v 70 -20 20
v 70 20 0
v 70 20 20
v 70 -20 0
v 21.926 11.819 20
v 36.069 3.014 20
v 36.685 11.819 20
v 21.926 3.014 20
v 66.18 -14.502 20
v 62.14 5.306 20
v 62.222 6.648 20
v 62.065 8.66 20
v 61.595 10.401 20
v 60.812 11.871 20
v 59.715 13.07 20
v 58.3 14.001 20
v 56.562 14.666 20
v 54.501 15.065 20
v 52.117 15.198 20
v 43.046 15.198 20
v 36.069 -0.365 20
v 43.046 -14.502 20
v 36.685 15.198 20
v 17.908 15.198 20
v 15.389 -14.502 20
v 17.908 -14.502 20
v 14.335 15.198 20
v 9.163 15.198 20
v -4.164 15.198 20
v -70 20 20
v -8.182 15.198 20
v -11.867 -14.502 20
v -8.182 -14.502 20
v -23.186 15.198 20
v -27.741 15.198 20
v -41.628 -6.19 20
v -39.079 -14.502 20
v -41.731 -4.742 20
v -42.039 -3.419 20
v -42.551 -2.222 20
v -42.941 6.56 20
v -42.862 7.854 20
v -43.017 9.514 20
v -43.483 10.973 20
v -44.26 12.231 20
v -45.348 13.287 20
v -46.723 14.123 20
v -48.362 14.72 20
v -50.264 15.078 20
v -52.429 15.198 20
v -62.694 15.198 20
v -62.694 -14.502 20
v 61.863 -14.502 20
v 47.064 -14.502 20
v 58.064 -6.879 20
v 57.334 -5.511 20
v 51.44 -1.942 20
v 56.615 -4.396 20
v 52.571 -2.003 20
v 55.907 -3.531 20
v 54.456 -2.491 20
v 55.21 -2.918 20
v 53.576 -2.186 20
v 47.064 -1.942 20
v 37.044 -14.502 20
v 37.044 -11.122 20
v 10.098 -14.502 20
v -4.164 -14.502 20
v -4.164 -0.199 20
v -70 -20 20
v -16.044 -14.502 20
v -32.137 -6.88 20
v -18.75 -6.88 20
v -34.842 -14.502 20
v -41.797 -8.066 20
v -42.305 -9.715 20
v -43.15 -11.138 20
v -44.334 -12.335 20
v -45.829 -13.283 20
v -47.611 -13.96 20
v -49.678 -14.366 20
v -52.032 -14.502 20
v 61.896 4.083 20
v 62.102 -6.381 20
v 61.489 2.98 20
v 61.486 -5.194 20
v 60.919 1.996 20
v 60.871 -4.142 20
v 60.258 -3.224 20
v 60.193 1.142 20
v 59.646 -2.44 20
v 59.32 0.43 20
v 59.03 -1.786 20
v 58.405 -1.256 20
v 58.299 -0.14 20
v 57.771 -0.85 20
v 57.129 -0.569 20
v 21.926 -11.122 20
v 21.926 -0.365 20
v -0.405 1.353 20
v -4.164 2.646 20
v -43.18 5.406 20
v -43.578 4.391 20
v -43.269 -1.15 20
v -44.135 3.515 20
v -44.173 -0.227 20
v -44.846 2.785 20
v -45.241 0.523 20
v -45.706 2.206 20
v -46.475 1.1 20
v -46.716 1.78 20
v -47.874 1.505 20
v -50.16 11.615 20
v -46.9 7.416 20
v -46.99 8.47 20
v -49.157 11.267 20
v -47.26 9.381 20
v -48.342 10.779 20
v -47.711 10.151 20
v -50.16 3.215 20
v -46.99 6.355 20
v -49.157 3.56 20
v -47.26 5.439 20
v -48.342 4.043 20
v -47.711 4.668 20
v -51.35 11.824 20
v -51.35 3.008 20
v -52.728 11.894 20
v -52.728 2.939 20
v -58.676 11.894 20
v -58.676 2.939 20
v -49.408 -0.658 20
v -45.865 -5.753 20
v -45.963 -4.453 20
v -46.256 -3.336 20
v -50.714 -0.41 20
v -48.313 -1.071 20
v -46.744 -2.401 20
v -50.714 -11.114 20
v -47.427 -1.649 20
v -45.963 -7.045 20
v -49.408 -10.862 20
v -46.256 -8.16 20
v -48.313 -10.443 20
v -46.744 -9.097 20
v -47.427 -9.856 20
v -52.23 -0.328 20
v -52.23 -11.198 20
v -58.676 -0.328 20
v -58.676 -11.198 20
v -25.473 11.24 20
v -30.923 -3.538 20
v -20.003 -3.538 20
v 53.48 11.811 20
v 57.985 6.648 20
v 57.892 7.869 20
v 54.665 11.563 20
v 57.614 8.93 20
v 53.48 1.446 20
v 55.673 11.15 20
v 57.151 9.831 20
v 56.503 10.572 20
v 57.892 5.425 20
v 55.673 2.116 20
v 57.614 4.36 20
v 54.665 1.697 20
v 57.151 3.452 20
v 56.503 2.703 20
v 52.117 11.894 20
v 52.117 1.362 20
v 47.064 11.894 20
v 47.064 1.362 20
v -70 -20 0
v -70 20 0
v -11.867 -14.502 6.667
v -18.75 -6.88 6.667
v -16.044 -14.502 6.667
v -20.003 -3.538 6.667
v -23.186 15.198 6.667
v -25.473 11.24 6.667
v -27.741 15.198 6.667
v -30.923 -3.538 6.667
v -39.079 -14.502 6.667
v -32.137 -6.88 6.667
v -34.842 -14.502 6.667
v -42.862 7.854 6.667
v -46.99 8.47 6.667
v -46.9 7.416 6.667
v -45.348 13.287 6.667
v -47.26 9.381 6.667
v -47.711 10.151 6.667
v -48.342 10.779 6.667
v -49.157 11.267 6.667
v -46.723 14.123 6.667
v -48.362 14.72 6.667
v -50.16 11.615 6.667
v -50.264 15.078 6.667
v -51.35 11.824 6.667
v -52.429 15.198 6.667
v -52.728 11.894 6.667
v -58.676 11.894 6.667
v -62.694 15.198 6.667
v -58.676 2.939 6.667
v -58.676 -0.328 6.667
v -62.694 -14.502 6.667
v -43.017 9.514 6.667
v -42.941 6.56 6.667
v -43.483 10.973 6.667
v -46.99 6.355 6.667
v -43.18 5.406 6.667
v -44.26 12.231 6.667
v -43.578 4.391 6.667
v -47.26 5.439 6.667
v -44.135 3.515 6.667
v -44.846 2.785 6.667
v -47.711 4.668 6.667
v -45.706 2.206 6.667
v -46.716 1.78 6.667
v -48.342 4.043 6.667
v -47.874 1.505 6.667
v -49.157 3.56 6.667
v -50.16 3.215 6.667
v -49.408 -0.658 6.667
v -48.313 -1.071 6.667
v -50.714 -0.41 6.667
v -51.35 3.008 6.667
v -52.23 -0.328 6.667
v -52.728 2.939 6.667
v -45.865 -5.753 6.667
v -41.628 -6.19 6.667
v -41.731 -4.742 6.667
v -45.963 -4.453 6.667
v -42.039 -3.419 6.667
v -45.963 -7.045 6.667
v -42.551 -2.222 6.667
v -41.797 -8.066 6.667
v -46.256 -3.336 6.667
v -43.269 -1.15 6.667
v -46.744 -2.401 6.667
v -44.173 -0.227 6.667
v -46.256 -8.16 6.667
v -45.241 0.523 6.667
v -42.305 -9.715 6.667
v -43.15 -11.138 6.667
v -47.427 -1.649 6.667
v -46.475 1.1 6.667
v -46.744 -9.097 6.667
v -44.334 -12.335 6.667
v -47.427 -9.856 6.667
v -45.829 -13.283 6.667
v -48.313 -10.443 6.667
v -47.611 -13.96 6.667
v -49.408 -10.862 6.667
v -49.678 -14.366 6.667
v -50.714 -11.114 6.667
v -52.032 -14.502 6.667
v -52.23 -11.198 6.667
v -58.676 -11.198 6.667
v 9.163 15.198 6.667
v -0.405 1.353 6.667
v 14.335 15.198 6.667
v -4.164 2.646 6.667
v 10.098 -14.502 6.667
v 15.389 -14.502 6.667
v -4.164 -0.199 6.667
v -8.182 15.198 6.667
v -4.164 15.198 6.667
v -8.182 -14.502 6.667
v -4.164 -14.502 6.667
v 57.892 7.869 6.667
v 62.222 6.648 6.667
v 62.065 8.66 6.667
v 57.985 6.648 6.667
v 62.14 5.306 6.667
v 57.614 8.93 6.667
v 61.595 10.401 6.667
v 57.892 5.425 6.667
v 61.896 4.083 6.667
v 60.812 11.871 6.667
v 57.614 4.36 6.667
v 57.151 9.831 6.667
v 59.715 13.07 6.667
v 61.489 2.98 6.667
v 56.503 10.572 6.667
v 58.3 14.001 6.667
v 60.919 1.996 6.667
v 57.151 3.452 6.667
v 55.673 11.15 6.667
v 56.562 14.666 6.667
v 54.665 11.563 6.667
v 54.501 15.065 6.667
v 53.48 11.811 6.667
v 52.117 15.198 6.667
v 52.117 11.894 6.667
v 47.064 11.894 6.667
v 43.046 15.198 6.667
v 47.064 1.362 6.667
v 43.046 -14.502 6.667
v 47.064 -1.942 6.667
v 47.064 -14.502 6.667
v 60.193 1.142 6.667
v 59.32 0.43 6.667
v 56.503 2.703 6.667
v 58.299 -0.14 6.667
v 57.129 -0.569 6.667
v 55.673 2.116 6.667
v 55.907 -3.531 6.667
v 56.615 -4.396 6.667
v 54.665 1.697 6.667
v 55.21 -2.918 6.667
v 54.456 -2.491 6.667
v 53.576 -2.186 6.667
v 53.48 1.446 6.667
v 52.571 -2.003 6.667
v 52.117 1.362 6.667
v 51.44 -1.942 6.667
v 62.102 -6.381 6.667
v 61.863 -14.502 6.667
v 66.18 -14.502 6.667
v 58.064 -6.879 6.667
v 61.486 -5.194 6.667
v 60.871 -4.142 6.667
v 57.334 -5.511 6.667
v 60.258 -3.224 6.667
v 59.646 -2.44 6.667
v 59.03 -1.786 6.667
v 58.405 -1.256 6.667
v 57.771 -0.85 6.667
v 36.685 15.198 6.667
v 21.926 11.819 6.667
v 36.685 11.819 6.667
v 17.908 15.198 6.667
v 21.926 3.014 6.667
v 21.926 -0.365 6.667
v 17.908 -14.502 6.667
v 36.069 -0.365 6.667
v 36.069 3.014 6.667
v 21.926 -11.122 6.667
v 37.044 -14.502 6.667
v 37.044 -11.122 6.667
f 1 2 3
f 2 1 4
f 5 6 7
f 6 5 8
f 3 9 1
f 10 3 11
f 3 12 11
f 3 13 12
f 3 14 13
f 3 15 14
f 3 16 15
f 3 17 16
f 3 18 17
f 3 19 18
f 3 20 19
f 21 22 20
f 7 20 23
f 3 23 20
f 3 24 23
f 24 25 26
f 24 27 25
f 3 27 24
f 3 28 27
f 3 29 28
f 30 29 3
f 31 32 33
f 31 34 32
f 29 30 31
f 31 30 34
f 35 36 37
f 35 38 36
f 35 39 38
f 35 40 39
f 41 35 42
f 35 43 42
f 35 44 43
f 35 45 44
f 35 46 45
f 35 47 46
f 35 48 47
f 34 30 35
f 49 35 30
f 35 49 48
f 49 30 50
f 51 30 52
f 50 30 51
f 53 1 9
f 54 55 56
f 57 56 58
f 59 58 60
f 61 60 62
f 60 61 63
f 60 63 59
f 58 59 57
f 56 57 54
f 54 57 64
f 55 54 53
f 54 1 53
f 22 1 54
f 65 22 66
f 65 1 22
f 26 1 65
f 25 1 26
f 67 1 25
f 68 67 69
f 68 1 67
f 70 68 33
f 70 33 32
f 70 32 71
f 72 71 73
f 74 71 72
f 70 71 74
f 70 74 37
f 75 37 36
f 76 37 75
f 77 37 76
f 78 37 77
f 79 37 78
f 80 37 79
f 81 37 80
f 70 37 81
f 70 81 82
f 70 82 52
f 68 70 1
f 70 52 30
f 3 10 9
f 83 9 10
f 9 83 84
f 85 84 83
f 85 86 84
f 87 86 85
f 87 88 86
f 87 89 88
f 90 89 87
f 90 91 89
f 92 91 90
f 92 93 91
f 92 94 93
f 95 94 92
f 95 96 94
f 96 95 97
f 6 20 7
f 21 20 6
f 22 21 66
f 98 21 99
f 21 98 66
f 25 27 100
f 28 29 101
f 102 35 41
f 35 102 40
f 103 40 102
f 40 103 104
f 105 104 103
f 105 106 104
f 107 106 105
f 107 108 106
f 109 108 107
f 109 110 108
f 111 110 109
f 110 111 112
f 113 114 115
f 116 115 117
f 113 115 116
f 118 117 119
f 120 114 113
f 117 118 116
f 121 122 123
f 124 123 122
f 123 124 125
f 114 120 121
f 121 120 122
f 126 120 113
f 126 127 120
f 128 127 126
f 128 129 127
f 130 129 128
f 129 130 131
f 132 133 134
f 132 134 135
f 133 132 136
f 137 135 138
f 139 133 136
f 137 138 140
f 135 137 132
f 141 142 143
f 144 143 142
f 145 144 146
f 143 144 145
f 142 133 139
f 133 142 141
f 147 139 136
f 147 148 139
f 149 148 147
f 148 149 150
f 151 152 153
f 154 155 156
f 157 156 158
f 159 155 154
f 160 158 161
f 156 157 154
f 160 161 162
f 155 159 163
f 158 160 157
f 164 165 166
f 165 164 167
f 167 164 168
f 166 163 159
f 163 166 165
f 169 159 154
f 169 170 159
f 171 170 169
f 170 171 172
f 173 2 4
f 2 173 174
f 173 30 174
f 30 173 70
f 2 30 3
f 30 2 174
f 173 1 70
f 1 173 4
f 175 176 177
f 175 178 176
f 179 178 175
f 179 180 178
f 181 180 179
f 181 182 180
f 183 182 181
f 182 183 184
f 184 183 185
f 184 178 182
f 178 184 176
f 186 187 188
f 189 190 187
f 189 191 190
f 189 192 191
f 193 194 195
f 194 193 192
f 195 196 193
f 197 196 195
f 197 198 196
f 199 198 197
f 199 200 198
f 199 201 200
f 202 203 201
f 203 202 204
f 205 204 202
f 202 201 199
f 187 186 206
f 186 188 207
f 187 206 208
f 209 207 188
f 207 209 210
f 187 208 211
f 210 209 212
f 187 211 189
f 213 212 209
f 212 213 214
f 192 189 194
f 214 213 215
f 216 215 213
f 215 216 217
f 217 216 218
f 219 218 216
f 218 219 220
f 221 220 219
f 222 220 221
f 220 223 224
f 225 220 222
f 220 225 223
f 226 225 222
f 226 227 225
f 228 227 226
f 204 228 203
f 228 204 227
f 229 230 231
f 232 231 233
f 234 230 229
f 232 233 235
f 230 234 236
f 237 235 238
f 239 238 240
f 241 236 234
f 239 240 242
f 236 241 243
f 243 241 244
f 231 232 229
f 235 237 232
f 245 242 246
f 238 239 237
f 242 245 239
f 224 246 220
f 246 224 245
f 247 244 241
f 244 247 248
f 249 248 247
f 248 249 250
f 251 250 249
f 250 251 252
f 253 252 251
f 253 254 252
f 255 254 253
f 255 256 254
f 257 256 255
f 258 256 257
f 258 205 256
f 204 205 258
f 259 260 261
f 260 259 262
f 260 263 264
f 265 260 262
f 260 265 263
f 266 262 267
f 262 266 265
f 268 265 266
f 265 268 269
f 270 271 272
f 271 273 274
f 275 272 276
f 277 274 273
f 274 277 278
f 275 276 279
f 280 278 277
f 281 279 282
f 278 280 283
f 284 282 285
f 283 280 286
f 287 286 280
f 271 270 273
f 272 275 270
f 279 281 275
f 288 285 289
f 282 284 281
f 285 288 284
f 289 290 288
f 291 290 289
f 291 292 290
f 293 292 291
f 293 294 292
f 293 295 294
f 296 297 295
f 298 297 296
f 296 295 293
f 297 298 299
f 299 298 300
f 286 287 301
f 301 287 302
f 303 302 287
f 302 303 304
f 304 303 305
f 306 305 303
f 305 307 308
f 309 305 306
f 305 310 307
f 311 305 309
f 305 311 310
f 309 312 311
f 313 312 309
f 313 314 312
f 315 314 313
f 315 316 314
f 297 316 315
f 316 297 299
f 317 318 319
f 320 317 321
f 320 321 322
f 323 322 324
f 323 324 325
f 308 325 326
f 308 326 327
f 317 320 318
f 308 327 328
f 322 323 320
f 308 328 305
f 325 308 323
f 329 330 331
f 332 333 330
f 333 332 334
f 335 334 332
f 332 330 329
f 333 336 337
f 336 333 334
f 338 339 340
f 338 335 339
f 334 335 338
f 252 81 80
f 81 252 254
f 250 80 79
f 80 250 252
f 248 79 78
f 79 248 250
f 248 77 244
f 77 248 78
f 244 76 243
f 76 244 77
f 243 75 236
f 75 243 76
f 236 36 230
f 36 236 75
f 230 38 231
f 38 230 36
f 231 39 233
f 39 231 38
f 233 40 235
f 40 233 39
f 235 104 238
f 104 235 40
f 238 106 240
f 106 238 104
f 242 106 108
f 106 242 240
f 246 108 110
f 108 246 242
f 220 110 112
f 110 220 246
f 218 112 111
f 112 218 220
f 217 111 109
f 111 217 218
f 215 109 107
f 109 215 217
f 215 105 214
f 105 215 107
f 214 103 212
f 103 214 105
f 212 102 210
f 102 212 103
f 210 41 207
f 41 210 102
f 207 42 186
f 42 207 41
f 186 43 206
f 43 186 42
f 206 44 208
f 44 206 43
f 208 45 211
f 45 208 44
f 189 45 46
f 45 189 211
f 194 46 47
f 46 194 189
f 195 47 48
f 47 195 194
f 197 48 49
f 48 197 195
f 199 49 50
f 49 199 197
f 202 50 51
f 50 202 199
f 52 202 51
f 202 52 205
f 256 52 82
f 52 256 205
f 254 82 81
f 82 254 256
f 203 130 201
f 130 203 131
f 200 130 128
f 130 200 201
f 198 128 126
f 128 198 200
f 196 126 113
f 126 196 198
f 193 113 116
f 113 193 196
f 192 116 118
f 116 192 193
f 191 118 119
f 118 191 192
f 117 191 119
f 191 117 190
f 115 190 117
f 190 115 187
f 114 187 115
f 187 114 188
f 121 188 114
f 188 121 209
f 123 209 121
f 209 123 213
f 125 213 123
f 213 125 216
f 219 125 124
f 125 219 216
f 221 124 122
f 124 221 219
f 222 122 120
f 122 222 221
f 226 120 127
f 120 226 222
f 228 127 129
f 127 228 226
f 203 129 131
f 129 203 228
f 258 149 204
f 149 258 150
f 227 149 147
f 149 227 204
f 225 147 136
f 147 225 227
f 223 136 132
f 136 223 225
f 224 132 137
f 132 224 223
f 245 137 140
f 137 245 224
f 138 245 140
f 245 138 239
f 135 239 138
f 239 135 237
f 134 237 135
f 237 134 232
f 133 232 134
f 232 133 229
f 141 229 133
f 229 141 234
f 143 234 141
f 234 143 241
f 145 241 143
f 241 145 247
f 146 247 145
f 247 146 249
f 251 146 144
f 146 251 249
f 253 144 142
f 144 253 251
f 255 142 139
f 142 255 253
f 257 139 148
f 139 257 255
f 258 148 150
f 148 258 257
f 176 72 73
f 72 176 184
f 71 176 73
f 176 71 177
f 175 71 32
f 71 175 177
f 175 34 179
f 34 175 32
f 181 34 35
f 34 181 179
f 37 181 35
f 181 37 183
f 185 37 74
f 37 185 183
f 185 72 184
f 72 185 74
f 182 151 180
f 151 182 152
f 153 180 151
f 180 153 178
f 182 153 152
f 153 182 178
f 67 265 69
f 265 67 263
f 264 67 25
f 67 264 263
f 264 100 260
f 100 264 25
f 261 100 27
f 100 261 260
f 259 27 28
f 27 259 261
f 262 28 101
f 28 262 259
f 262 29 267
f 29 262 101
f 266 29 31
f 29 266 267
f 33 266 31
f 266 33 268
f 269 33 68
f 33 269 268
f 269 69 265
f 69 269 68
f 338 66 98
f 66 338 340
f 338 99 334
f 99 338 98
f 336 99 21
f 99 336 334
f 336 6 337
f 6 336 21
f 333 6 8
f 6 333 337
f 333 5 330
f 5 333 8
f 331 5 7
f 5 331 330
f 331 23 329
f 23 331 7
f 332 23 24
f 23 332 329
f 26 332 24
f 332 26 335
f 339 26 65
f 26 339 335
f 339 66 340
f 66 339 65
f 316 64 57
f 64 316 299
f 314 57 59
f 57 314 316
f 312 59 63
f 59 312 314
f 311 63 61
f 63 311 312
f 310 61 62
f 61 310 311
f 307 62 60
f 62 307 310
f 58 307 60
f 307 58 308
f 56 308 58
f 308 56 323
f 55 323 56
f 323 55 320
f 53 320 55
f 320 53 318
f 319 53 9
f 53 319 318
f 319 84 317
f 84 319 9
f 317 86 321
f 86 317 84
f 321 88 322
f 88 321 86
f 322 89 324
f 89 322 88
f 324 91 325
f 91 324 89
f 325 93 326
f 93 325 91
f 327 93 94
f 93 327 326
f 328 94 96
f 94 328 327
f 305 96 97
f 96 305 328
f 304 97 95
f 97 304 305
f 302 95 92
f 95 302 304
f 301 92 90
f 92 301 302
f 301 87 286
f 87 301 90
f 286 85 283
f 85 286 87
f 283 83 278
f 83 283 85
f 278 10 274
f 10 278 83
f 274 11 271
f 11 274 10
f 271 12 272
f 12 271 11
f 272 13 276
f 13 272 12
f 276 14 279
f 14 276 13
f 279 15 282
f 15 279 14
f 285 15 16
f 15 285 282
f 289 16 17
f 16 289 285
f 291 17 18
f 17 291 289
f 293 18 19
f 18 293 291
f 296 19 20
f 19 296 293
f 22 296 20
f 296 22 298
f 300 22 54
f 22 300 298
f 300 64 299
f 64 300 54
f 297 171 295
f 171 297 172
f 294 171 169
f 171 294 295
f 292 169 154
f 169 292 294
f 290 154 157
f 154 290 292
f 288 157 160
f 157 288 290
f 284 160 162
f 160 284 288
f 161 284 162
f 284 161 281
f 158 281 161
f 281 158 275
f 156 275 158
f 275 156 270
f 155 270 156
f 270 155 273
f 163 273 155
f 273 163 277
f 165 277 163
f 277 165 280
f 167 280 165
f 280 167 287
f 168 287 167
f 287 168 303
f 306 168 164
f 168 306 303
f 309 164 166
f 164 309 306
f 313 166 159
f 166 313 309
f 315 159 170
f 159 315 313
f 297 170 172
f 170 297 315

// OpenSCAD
// LetterBlock.scad - Basic usage of text() and linear_extrude()

// Module instantiation
LetterBlock("BAKER",40,140);

// Module definition.
// size=30 defines an optional parameter with a default value.
module LetterBlock(letter, height=30,width=0,depth=0) {
    width = width==0 ? height : width;
    depth = depth==0 ? height/2 : depth;
    size=height;
    difference() {
        translate([0,0,size/4]) cube([width,height,depth], center=true);
        translate([0,0,size/6]) {
            // convexity is needed for correct preview
            // since characters can be highly concave
            linear_extrude(height=size, convexity=4)
                text(letter, 
                     size=size*22/30,
                     font="Bitstream Vera Sans",
                     halign="center",
                     valign="center");
        }
    }
}

echo(version=version());
// Written by Marius Kintel <marius@kintel.net>
//
// To the extent possible under law, the author(s) have dedicated all
// copyright and related and neighboring rights to this software to the
// public domain worldwide. This software is distributed without any
// warranty.
//
// You should have received a copy of the CC0 Public Domain
// Dedication along with this software.
// If not, see <http://creativecommons.org/publicdomain/zero/1.0/>.
